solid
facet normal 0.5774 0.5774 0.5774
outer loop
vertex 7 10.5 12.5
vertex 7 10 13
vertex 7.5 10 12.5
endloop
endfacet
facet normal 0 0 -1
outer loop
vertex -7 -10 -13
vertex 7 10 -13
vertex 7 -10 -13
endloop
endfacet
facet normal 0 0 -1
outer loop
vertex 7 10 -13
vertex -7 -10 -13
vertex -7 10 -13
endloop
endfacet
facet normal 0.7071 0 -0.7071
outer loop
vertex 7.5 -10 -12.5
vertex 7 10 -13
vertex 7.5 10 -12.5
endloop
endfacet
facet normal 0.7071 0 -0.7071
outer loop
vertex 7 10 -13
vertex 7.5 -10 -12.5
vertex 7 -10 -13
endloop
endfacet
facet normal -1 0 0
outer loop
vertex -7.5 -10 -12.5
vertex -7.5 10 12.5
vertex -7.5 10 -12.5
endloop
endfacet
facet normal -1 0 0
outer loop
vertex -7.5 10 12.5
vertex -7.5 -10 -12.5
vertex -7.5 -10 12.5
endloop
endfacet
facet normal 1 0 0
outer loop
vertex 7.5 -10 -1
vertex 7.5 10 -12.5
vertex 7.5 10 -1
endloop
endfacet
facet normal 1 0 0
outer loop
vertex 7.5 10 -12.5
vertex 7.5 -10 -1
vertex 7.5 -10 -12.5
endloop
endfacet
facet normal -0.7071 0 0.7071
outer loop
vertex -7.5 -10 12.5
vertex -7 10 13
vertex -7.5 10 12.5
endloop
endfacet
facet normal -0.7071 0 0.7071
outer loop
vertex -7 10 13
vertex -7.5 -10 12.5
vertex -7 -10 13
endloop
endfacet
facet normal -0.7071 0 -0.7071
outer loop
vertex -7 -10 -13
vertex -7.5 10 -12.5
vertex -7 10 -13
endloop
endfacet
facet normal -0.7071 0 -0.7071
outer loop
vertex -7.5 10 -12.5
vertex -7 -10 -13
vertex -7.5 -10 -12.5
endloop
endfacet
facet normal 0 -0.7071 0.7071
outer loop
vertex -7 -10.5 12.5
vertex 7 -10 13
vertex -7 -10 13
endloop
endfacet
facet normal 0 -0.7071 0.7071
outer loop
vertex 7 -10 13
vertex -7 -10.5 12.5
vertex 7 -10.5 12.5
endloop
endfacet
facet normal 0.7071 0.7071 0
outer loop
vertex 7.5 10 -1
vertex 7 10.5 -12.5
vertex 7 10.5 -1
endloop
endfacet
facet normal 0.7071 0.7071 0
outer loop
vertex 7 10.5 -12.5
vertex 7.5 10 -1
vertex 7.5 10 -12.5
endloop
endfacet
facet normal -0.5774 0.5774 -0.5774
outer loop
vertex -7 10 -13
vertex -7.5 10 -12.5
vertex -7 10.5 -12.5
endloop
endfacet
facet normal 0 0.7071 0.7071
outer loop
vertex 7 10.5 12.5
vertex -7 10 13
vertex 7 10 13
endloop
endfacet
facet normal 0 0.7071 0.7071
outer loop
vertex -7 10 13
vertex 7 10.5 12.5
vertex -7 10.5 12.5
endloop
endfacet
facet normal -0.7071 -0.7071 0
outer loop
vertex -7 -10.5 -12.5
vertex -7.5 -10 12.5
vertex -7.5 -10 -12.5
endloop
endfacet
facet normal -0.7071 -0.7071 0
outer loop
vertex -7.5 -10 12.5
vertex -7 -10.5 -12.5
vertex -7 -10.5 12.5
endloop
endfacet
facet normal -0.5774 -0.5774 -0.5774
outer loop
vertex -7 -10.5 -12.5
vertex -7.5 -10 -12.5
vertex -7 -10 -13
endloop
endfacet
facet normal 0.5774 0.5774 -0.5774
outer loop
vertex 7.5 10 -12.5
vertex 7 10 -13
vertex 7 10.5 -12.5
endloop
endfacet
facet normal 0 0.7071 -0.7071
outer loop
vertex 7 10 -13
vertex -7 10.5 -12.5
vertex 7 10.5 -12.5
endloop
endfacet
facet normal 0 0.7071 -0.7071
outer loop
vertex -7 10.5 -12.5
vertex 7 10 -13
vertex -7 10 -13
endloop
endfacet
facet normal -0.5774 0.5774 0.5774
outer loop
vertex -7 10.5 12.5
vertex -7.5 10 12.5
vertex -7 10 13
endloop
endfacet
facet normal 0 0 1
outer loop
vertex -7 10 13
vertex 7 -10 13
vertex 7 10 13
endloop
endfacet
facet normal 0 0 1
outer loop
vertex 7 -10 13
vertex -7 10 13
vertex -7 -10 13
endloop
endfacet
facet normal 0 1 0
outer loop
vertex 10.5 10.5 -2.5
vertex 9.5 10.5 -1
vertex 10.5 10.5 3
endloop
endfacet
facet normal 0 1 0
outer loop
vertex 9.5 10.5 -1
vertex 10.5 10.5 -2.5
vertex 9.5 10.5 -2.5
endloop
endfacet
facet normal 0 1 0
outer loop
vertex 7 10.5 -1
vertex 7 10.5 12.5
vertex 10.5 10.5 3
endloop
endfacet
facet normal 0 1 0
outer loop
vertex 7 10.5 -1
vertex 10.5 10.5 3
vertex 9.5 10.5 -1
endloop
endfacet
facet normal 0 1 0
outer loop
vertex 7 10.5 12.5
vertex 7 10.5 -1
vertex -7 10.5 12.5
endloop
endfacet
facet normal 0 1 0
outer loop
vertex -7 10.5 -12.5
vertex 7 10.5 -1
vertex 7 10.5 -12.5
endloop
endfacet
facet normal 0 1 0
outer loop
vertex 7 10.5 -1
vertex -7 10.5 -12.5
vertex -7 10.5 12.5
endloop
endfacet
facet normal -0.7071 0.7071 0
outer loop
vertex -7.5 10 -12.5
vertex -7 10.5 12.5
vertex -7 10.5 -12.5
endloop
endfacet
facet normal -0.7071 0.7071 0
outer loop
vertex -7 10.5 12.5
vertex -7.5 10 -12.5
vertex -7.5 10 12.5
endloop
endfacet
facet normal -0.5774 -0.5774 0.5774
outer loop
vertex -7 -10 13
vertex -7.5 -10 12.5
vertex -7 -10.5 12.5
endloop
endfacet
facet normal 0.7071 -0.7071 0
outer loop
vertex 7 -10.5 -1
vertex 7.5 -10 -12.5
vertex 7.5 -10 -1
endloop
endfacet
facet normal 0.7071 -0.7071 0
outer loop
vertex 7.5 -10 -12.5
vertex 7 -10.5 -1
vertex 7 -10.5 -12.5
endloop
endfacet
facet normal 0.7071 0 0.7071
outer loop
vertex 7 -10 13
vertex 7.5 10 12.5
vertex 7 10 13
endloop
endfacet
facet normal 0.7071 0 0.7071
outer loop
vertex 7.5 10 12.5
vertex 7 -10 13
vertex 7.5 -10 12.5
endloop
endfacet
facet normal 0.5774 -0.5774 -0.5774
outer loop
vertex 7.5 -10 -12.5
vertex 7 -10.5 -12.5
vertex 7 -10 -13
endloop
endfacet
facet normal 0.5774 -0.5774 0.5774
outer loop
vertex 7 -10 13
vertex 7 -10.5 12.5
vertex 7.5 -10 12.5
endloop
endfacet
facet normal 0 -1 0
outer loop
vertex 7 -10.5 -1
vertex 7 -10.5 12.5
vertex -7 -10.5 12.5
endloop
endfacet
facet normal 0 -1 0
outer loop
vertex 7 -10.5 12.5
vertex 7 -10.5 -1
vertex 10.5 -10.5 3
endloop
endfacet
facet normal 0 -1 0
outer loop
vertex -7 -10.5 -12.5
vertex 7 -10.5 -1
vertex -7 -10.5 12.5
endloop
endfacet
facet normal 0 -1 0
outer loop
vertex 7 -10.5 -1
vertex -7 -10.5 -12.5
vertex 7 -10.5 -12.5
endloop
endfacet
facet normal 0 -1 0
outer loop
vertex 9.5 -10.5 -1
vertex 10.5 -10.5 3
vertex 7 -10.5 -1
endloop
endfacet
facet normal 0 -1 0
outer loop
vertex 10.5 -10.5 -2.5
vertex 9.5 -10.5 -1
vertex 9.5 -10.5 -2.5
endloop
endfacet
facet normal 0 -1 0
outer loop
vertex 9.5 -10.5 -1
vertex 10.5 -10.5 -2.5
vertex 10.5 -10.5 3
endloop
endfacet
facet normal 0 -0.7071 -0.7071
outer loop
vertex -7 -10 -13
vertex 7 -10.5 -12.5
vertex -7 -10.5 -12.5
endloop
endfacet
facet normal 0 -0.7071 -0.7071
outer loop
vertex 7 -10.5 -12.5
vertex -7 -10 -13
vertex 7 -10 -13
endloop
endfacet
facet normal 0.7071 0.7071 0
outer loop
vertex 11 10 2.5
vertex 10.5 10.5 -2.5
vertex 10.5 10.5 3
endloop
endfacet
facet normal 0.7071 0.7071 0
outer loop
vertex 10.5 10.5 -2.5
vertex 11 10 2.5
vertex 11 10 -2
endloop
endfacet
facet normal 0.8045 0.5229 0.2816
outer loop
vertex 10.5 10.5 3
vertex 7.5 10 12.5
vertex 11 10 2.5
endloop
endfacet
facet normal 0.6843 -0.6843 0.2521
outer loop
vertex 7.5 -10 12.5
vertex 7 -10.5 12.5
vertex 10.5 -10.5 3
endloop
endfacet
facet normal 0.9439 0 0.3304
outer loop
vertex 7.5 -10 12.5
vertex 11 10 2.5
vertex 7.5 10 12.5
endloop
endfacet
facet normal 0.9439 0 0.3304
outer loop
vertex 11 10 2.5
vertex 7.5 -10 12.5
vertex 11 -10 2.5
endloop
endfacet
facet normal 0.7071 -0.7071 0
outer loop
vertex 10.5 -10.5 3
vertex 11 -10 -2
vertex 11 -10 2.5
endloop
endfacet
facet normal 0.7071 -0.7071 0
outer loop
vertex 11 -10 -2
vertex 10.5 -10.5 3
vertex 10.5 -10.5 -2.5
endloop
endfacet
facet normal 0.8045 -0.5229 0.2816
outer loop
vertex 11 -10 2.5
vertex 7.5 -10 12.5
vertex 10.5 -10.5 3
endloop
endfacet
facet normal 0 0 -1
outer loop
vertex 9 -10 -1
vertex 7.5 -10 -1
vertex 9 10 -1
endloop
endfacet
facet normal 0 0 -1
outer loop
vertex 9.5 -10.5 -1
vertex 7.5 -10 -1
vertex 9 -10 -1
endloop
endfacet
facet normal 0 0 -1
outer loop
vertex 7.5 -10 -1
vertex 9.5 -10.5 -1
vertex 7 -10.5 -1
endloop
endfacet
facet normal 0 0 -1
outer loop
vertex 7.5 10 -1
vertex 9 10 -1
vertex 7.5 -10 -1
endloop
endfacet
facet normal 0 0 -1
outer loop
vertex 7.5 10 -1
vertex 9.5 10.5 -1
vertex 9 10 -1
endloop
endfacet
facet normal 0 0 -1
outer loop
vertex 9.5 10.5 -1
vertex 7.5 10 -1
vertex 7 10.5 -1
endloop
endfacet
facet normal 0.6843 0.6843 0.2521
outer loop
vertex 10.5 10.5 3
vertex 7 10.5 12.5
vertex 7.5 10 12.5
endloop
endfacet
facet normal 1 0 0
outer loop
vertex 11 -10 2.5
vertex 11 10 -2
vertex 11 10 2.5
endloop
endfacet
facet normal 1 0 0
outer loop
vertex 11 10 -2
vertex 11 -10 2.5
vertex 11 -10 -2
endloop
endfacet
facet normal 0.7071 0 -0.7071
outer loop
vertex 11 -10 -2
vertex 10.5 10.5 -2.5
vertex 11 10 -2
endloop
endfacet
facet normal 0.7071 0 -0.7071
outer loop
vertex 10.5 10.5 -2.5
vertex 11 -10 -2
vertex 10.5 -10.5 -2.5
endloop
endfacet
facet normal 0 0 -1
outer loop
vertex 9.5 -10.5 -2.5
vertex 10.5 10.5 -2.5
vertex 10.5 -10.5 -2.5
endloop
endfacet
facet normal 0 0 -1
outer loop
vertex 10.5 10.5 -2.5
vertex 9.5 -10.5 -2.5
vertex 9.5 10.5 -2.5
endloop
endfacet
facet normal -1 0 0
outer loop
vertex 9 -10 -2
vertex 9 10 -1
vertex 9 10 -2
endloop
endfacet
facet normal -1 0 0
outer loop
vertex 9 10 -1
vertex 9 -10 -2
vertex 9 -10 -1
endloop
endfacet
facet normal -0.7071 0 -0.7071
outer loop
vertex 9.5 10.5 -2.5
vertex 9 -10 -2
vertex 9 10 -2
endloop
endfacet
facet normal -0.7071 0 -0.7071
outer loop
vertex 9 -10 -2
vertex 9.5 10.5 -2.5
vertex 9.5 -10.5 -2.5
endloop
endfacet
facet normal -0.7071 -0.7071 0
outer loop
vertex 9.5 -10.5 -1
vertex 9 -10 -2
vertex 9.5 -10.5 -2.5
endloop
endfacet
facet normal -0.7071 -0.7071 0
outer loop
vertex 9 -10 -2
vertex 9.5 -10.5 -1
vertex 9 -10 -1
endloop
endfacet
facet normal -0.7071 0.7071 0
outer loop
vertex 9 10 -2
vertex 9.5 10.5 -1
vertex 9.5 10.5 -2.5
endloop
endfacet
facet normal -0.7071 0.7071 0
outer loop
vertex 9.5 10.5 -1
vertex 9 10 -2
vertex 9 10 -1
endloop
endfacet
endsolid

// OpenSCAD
difference(){
	union(){
		hull(){
			cube([14,21,25], center=true);
			cube([15,20,25], center=true);
			cube([14,20,26], center=true);
		}
		translate([8,0,1])
		hull(){
			cube([5,21,4], center=true);
			cube([6,20,3], center=true);
			translate([-3.5,0,10])
			hull(){
				cube([6,20,3], center=true);
				translate([-0.5,0,0])
					cube([6,21,3], center=true);
			}
		}
		translate([10,0,-0.5])
		hull(){
			cube([2,20,3], center=true);
			cube([1,21,4], center=true);
		}
	}
	union(){
	}
}
